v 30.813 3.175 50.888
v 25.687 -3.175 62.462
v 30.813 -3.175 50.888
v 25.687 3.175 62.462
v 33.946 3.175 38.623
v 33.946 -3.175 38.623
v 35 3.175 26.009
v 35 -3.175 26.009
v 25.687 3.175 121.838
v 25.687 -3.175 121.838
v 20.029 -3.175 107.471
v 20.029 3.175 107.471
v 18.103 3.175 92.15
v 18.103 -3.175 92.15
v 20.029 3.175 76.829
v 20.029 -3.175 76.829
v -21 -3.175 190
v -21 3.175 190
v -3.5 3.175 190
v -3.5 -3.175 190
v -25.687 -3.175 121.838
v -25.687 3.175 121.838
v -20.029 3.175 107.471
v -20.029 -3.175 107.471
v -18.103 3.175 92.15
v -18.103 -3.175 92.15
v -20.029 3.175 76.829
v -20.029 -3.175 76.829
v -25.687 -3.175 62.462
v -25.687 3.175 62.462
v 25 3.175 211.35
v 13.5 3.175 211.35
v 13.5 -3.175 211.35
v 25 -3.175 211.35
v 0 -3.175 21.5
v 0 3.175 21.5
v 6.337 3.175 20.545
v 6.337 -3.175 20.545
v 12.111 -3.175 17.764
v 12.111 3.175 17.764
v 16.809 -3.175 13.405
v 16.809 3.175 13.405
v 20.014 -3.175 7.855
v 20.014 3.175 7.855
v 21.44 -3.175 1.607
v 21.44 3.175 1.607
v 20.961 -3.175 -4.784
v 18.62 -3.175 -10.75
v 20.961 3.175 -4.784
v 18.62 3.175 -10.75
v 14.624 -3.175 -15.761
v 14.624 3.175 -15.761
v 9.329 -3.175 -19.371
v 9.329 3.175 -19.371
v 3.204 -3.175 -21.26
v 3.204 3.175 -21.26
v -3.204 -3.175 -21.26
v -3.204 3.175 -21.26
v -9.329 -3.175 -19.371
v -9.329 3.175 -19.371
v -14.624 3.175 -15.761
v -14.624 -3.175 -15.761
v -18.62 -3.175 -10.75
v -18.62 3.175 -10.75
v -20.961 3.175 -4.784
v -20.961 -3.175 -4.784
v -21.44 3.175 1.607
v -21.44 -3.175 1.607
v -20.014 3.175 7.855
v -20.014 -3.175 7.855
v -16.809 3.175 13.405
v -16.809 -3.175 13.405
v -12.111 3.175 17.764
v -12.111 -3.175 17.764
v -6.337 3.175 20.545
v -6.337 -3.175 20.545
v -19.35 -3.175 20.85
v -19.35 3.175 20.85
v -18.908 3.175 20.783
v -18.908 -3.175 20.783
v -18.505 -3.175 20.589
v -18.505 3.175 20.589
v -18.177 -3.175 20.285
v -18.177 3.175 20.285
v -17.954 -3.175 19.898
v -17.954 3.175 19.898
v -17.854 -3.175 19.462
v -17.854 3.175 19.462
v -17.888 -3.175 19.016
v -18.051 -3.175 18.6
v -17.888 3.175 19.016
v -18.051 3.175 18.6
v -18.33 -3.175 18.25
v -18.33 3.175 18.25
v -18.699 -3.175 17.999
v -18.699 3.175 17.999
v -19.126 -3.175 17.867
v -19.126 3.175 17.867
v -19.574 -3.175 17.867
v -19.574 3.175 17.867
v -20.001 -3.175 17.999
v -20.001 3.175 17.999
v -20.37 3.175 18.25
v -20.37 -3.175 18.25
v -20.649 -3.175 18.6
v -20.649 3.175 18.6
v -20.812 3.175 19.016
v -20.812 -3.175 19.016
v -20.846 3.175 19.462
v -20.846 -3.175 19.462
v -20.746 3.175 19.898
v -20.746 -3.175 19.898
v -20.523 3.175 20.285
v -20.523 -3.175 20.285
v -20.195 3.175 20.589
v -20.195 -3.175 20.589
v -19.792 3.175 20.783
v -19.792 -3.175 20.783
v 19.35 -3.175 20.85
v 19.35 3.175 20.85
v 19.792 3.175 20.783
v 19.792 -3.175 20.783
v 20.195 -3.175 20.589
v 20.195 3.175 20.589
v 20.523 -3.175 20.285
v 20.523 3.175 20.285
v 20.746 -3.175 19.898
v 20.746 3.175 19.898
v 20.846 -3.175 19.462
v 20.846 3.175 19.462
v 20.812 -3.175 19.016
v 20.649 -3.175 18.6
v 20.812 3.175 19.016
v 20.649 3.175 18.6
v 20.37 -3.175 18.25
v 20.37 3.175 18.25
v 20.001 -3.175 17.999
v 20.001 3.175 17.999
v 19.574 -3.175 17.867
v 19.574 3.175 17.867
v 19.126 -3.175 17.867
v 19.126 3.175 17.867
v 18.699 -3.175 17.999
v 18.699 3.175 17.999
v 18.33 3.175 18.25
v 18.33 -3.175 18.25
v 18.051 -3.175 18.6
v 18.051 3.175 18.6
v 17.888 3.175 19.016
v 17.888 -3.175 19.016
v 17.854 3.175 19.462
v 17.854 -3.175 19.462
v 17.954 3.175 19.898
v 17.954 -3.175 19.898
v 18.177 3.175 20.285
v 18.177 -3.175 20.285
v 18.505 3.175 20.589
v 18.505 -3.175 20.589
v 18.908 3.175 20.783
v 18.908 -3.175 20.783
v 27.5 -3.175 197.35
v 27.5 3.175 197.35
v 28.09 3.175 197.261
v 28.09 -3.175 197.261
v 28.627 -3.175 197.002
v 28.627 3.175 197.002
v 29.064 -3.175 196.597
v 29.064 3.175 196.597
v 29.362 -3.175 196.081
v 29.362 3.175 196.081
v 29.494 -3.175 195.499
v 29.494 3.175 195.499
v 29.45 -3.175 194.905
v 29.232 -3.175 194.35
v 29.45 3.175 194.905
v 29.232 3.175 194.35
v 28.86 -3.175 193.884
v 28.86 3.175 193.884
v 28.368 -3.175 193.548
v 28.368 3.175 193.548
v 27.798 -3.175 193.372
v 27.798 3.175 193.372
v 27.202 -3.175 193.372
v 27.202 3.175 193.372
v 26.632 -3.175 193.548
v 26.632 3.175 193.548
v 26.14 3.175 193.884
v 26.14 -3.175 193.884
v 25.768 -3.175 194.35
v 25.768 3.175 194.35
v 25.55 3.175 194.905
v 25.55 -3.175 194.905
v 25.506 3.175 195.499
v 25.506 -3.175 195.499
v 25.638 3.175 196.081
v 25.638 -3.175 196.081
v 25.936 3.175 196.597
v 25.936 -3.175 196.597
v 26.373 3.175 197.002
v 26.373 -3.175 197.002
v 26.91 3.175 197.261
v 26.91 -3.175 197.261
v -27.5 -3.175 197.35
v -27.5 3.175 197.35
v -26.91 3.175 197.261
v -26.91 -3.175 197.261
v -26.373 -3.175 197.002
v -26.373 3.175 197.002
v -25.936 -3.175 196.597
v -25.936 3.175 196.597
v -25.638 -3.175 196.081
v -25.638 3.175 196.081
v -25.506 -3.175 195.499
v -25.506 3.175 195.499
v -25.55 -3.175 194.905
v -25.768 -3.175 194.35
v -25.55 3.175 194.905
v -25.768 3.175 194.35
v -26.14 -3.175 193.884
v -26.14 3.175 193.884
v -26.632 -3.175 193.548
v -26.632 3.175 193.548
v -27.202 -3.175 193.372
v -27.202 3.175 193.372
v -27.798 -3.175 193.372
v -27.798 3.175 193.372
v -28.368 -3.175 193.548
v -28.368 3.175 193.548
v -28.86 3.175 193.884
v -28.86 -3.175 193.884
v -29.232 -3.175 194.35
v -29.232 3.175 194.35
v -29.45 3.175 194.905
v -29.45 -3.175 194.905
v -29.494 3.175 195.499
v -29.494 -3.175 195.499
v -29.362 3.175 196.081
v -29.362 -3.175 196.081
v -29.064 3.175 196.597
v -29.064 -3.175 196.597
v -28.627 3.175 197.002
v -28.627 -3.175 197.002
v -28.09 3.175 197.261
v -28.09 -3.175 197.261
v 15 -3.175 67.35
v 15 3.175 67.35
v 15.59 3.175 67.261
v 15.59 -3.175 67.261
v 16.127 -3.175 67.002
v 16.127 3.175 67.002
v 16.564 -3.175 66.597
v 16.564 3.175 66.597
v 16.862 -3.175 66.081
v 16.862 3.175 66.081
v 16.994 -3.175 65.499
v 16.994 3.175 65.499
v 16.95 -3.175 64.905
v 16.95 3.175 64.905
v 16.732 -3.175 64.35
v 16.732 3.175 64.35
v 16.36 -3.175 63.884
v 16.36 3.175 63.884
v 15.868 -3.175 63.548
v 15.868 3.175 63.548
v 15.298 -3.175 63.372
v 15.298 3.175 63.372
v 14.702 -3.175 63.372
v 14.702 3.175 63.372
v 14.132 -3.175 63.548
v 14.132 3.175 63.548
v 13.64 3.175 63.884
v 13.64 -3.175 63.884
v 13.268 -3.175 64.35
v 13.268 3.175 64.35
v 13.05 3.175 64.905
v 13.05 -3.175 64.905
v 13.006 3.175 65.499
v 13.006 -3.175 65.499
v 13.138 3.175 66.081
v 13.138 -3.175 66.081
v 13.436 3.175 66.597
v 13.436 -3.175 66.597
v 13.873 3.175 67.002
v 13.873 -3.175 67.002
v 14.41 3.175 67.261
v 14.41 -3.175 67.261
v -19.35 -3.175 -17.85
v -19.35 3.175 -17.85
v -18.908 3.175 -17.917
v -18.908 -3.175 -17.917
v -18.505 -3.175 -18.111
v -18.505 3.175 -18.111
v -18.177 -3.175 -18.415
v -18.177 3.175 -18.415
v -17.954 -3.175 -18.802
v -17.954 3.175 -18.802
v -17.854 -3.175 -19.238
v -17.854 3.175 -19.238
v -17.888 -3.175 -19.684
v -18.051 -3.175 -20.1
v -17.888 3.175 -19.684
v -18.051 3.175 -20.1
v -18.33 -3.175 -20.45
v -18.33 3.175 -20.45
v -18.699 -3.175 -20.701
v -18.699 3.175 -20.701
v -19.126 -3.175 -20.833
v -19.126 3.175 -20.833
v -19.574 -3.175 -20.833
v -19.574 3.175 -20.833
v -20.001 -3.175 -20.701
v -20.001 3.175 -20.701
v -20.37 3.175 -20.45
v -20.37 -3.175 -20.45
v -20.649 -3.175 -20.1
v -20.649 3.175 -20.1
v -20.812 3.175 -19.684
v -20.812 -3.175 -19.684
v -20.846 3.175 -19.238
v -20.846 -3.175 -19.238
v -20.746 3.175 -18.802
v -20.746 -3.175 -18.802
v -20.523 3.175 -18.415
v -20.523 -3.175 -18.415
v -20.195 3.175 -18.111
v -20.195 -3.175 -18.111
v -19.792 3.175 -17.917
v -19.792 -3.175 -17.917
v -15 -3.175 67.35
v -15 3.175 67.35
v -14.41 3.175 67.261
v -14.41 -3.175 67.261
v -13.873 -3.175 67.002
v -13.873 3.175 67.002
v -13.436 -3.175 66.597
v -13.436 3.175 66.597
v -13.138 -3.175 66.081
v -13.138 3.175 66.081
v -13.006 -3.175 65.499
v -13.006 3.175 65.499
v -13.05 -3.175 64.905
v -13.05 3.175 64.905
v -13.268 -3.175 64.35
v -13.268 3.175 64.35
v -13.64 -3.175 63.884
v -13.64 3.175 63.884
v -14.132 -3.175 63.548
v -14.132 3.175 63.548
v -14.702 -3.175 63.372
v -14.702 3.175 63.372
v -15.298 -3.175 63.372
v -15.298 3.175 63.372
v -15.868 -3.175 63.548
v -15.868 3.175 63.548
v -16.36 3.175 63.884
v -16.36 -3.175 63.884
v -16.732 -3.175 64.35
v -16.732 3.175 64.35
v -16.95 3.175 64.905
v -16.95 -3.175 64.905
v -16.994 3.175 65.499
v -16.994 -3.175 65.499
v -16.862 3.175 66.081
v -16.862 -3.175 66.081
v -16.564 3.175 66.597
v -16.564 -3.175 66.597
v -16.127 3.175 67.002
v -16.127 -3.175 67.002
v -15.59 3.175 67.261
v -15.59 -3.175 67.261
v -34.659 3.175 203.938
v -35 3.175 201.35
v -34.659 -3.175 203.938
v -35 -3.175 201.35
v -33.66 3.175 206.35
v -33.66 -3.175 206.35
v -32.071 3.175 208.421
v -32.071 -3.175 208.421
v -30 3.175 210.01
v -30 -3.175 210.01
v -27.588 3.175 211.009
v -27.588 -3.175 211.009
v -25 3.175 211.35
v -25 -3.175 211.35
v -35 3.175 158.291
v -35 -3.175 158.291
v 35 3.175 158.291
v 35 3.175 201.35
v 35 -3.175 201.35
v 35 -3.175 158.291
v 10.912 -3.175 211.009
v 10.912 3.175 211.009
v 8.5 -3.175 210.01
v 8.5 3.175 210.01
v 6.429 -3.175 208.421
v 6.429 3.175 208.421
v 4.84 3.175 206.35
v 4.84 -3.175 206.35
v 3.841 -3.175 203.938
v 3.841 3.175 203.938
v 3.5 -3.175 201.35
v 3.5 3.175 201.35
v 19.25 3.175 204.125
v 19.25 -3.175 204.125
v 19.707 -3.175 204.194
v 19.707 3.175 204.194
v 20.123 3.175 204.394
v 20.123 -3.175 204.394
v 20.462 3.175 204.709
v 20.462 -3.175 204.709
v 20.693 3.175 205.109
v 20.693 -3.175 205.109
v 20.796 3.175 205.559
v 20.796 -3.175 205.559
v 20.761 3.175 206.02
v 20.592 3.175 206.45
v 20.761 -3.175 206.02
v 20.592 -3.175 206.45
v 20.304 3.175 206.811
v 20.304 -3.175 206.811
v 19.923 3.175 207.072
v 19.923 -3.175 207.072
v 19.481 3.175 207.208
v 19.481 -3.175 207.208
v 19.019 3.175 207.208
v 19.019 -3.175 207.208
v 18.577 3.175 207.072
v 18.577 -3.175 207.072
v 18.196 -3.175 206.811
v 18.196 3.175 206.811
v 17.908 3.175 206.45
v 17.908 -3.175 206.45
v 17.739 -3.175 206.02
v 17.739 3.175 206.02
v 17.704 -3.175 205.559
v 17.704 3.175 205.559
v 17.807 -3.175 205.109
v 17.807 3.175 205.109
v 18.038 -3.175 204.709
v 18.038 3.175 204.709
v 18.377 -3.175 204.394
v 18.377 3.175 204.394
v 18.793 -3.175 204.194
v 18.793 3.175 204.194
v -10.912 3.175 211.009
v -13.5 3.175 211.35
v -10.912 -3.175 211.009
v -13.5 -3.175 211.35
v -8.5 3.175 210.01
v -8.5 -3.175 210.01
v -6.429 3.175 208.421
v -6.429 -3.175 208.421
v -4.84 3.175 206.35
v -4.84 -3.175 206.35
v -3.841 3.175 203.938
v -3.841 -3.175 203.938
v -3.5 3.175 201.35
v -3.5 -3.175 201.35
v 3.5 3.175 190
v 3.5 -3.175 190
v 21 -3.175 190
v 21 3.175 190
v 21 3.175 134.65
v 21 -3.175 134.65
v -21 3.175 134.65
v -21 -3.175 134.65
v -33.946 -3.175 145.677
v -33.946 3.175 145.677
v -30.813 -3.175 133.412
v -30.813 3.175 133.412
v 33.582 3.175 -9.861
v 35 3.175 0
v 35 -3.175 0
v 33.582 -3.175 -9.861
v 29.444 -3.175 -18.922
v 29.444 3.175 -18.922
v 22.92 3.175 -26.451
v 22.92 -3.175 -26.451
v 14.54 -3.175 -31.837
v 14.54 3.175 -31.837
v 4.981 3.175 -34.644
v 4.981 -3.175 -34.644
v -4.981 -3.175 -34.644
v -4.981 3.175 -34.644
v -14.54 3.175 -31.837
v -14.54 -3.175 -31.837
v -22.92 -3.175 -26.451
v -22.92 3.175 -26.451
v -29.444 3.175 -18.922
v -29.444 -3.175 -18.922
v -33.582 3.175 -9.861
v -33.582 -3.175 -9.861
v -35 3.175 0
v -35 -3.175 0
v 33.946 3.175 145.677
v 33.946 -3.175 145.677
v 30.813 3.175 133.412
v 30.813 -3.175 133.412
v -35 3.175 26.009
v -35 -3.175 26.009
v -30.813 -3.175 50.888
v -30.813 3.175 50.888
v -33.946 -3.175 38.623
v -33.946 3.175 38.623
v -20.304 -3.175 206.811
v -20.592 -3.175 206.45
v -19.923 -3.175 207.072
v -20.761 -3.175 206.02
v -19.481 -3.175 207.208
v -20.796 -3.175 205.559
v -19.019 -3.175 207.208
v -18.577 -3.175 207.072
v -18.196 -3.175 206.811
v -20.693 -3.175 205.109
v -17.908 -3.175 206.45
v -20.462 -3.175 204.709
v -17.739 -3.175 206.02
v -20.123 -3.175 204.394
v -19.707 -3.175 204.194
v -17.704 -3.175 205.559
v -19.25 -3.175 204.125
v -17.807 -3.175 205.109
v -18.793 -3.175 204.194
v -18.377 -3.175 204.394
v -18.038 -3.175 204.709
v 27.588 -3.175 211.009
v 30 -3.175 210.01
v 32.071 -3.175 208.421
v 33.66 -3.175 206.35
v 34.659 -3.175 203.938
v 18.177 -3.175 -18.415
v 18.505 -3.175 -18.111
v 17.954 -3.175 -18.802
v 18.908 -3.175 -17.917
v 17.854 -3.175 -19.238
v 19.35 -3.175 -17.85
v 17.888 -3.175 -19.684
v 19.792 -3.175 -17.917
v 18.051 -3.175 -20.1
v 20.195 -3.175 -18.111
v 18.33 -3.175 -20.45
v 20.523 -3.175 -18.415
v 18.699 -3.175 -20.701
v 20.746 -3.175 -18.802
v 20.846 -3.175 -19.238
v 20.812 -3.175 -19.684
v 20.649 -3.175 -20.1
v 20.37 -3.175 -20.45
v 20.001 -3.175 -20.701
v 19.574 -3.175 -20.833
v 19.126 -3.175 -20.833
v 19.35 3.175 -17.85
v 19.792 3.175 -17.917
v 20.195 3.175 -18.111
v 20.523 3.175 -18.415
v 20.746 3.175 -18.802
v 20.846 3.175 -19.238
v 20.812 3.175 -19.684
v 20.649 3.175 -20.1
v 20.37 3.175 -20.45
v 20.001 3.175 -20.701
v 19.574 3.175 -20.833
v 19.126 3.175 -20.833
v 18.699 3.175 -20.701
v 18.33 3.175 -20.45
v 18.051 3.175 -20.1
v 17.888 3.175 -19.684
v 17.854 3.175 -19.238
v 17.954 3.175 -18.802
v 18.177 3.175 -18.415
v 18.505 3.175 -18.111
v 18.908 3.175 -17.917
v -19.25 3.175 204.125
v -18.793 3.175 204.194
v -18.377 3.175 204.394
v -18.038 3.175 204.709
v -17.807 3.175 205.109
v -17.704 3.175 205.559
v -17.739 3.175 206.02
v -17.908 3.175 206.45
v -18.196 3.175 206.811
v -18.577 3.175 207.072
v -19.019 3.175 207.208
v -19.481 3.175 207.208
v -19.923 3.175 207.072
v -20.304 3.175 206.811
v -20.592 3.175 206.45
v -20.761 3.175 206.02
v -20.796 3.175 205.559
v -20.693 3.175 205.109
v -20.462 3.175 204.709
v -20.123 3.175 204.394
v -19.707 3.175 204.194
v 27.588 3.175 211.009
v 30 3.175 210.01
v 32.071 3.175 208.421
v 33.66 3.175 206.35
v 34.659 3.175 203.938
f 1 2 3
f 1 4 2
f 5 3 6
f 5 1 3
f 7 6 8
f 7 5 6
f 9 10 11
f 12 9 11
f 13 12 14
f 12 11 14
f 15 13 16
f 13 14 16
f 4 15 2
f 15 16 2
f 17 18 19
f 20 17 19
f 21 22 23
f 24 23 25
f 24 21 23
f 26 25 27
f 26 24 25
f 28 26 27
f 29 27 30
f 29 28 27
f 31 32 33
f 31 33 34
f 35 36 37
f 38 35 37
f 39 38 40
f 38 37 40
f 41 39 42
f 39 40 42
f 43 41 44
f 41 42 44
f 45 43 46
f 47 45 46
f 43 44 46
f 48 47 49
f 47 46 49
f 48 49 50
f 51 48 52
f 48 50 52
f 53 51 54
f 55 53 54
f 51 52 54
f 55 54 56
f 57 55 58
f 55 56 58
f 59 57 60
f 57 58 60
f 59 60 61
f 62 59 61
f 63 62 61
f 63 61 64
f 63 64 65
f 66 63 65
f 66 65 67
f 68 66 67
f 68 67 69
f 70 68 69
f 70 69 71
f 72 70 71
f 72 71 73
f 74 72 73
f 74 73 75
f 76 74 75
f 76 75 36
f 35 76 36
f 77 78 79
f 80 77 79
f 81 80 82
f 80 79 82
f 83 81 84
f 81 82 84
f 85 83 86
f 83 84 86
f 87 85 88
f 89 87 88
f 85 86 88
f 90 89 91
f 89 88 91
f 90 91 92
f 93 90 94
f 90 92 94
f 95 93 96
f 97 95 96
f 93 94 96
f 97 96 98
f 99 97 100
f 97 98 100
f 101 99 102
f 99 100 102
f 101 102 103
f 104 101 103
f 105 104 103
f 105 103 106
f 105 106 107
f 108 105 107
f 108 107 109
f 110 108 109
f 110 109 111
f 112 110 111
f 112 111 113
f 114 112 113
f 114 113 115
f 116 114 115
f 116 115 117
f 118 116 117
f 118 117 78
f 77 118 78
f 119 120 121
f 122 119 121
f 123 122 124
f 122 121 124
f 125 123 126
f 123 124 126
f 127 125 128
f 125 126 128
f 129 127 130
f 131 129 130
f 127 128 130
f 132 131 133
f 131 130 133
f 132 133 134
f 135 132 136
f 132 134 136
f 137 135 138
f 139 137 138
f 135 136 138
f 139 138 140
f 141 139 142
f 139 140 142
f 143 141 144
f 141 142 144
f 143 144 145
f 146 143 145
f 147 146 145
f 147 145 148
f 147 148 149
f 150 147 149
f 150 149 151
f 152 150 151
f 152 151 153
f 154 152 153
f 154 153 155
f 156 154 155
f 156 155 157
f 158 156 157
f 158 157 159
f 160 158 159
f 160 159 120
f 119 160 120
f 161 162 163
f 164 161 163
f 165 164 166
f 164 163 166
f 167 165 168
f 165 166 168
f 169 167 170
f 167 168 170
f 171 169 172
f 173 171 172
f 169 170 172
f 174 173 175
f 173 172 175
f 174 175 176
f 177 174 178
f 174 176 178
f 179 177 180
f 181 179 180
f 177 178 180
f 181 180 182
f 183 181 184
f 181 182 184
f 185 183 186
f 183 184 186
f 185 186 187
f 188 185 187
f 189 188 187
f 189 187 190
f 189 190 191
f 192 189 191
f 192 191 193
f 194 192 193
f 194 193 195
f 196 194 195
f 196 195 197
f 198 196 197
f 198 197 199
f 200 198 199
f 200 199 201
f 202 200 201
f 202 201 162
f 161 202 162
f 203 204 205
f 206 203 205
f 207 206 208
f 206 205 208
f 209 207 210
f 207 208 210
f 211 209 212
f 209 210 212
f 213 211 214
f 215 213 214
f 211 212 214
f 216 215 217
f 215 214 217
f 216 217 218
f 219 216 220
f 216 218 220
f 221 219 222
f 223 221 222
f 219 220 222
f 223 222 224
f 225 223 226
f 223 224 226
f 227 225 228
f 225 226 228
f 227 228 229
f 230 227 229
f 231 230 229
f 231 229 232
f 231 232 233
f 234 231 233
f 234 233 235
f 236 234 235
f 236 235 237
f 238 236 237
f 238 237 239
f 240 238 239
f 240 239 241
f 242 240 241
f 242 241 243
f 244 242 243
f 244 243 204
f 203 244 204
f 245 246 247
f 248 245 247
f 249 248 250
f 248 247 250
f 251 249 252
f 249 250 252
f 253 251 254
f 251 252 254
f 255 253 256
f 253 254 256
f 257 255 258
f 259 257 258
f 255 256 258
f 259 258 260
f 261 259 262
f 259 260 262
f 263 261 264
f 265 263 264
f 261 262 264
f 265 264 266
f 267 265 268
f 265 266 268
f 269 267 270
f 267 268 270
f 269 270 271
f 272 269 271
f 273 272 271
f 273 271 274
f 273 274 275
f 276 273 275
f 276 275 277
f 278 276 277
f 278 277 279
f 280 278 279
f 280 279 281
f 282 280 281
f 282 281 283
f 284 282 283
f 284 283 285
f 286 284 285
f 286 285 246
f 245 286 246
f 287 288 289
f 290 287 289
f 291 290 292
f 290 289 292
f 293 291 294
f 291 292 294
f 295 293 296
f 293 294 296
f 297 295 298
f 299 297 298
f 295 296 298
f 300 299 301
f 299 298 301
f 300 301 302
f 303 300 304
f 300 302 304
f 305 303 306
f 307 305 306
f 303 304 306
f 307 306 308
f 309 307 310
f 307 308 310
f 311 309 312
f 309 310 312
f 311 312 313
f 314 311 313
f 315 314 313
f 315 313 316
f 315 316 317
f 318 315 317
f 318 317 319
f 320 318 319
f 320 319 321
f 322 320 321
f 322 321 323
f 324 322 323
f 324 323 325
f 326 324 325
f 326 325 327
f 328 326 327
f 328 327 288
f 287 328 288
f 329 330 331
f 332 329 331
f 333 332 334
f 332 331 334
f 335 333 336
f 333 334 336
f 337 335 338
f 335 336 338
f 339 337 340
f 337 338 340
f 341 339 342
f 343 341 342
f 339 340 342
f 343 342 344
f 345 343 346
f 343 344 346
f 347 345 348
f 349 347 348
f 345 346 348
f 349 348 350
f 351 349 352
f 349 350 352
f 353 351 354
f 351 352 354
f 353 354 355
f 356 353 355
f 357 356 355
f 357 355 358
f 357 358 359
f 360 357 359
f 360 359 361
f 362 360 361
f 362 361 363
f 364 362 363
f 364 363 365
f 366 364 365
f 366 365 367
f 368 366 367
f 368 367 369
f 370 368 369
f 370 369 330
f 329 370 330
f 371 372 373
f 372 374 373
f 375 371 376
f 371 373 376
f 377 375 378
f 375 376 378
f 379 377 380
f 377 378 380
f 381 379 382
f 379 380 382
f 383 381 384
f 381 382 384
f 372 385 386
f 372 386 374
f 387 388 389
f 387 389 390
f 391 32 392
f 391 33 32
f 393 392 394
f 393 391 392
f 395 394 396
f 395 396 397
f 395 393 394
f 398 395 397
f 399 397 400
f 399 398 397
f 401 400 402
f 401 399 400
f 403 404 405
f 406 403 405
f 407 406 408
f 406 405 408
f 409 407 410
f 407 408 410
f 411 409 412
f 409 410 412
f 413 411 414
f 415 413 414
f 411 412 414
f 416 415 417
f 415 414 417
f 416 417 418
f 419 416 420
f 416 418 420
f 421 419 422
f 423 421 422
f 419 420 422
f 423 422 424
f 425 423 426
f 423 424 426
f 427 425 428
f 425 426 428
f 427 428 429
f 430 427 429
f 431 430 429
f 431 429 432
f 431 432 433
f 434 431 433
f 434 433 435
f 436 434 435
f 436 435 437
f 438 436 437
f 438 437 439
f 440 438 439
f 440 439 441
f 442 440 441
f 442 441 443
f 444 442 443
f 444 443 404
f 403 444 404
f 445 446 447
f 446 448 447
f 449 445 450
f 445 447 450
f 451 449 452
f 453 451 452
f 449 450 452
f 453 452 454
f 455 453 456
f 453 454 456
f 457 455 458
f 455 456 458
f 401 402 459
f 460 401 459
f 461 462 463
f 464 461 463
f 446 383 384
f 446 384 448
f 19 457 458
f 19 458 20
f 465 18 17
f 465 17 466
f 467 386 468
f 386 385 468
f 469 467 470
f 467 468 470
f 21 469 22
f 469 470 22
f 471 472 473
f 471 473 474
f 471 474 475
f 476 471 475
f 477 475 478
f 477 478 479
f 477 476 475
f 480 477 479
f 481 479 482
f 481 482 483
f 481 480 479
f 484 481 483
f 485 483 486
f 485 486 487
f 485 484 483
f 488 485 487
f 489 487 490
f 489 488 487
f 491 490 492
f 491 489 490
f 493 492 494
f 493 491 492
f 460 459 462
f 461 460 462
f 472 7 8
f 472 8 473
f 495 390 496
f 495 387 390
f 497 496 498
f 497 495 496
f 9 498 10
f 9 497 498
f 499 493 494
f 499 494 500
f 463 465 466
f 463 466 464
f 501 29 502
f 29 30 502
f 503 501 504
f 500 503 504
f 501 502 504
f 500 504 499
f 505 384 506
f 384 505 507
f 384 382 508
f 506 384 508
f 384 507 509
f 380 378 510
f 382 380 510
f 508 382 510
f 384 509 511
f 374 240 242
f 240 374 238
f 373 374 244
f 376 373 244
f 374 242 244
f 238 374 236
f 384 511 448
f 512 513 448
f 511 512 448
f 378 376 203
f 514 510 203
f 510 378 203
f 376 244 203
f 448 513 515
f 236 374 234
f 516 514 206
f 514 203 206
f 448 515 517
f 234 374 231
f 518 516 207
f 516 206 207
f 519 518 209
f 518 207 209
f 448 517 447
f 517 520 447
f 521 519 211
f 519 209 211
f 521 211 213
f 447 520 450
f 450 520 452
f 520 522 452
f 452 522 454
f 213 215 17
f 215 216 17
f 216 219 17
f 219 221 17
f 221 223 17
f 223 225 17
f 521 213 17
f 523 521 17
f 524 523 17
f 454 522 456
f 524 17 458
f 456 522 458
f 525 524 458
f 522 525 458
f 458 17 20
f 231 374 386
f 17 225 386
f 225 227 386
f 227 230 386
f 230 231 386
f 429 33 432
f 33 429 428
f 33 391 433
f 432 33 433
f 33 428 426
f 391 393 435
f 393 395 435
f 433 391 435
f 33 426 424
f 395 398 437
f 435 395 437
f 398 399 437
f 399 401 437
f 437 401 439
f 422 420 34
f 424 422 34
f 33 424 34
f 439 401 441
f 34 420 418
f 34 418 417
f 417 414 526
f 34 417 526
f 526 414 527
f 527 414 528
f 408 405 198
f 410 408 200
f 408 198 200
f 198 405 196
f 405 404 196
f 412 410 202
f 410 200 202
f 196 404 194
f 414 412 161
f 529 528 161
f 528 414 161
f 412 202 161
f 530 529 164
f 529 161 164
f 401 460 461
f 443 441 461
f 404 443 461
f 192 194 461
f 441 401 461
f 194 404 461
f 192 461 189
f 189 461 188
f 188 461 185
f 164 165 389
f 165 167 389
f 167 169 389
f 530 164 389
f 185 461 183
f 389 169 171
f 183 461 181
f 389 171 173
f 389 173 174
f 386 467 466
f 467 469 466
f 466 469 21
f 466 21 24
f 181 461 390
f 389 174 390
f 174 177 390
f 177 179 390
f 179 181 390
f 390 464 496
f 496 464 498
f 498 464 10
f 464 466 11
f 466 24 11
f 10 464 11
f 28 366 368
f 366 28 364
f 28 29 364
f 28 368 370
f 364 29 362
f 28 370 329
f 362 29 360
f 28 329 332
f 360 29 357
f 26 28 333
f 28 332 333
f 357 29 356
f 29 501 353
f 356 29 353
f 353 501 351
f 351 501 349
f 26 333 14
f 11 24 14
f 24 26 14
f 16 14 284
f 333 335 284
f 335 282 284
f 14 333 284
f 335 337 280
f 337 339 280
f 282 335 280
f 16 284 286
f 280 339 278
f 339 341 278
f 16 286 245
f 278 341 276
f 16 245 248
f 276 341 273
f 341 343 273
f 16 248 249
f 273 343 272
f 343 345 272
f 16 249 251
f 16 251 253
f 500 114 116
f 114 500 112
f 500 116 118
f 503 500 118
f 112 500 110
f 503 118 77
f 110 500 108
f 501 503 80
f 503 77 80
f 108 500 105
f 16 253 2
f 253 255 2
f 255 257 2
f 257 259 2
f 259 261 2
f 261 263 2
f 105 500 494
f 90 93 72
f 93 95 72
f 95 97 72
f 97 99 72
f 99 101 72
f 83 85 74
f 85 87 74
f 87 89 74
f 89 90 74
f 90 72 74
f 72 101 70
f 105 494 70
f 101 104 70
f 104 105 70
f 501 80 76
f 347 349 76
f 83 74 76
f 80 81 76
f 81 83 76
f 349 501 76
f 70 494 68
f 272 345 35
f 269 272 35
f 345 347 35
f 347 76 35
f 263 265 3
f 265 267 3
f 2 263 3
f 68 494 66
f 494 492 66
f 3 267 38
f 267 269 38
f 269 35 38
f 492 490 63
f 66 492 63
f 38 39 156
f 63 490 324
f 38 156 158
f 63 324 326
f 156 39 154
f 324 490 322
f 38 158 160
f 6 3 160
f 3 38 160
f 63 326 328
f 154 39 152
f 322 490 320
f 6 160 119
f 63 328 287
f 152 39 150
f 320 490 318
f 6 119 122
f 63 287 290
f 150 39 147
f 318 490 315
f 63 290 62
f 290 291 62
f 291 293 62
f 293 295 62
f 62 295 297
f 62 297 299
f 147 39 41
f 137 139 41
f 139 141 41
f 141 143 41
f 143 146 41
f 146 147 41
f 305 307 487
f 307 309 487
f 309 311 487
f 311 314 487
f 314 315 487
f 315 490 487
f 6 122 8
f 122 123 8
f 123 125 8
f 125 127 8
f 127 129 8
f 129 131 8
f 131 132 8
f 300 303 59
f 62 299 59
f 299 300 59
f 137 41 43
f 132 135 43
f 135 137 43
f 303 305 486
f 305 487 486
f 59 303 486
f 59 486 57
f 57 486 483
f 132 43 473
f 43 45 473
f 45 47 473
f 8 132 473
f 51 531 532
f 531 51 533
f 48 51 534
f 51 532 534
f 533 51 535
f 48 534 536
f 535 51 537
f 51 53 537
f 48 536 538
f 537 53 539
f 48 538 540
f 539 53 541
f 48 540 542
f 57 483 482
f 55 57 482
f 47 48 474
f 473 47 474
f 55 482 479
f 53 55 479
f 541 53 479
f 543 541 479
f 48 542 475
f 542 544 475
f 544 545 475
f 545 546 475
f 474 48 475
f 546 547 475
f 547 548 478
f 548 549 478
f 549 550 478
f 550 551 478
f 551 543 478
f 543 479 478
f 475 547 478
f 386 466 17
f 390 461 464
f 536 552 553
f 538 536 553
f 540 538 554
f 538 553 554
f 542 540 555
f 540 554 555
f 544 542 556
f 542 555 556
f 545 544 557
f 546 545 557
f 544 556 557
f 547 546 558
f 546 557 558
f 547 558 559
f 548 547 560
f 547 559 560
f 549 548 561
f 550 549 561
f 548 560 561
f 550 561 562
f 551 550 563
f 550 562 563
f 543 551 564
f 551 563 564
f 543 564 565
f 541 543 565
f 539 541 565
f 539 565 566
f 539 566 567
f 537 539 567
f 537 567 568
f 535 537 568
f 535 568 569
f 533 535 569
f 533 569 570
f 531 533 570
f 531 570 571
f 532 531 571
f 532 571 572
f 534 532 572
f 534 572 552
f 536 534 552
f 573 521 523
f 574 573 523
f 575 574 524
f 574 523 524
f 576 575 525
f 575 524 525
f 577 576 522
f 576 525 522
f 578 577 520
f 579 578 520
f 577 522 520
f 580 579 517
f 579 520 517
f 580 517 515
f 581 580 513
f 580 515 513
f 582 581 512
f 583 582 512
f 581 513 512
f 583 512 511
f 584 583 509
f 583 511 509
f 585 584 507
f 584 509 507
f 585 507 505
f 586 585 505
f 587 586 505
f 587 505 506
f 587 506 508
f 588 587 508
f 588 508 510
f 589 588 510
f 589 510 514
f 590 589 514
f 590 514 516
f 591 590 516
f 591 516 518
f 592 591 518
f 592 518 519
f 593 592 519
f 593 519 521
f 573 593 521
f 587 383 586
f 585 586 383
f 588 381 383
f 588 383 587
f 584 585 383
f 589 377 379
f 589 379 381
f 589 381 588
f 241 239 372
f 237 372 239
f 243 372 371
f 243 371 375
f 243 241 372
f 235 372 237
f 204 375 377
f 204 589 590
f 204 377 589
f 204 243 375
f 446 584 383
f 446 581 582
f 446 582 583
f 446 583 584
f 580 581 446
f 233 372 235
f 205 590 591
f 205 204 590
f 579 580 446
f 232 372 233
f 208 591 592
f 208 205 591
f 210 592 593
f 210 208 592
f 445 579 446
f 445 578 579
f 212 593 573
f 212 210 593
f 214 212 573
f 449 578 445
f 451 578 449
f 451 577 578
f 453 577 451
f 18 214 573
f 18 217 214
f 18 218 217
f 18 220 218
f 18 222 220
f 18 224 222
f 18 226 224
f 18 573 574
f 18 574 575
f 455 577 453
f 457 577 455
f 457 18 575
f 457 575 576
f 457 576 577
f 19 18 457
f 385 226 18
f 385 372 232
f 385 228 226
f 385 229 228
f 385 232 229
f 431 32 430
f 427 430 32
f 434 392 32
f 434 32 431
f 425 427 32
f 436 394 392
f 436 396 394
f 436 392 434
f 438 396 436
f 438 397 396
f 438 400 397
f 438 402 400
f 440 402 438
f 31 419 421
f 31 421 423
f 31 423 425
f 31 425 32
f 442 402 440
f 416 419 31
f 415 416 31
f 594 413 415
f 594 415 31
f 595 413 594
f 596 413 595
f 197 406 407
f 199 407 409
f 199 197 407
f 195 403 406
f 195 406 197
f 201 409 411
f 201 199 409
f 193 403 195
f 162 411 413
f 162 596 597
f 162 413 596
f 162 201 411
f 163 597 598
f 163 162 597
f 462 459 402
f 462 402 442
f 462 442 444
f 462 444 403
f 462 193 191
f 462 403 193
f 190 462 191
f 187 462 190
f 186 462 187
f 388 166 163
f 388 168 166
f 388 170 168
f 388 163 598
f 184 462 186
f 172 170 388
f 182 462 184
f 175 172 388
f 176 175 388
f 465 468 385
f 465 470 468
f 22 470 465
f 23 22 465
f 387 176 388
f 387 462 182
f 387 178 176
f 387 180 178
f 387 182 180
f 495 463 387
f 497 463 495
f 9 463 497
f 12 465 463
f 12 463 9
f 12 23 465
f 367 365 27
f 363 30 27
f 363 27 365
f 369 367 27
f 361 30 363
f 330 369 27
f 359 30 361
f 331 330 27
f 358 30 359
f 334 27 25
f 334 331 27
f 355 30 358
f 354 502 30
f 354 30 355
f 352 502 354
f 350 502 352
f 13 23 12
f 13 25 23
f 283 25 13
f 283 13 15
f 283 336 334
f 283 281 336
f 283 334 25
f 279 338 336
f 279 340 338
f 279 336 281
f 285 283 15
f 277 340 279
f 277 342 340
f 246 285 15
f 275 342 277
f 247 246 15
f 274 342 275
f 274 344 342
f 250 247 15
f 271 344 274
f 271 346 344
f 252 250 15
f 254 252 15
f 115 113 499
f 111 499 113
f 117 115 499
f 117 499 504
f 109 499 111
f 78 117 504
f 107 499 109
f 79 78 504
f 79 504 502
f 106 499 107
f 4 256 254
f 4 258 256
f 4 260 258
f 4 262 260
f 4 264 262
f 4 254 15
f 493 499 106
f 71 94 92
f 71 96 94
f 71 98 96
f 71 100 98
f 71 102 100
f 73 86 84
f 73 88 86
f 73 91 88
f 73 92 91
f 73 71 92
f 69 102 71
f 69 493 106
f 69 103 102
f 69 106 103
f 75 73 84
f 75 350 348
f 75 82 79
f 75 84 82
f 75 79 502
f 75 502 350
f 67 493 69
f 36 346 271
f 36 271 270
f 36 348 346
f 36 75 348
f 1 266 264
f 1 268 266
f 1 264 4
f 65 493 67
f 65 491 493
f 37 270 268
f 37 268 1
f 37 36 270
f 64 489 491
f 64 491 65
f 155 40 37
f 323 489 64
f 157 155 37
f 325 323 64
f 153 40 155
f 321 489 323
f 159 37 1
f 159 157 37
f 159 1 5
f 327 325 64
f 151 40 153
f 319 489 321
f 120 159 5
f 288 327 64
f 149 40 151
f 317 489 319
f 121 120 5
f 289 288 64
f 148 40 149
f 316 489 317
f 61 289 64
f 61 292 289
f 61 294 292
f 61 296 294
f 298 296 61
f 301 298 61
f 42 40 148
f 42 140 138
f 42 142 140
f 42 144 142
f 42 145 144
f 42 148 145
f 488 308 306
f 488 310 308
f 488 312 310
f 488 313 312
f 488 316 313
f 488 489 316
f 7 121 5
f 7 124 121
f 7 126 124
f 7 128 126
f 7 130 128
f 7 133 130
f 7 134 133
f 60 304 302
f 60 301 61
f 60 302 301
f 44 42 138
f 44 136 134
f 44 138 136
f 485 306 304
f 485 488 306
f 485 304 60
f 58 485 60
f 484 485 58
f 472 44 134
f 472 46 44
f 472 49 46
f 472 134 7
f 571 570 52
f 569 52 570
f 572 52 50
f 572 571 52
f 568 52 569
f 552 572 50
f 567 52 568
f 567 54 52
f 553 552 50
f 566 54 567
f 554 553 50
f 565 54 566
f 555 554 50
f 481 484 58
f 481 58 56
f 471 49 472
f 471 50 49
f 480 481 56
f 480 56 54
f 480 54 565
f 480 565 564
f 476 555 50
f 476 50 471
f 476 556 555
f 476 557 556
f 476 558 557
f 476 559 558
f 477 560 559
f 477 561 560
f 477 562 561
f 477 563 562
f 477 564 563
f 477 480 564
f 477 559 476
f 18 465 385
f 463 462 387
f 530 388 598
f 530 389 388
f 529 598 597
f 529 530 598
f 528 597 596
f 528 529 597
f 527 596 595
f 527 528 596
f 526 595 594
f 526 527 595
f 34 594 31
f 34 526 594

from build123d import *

# Parameters (mm, degrees)
BOSS_EXTRUDE1_DEPTH = 3.175
SKETCH2_R           = 21.5
CUT_EXTRUDE1_DEPTH  = 215.322525648
SKETCH3_W           = 42
SKETCH3_H           = 55.35
SKETCH3_W_2         = 7
SKETCH3_H_2         = 21.35
CUT_EXTRUDE2_DEPTH  = 215.322525648
SKETCH4_R           = 1.5
CUT_EXTRUDE3_DEPTH  = 215.322525648
FILLET1_R           = 10
SKETCH5_R           = 2
CUT_EXTRUDE4_DEPTH  = 215.322525648
CUT_EXTRUDE5_DEPTH  = 215.322525648
FILLET3_R           = 76
SKETCH7_R           = 1.55
CUT_EXTRUDE6_DEPTH  = 215.322525648


with BuildPart() as part:
    # Sketch1 → Boss-Extrude1 (new, symmetric)
    with BuildSketch(Plane(origin=(0, 0, 0), x_dir=(1, 0, 0), z_dir=(0, 1, 0))):
        with BuildLine():
            Line((35, -211.35), (35, 0))
            ThreePointArc((35, 0), (0, 35), (-35, 0))
            Line((-35, 0), (-35, -211.35))
            Line((-35, -211.35), (35, -211.35))
        make_face()
    extrude(amount=BOSS_EXTRUDE1_DEPTH, both=True)

    # Sketch2 → Cut-Extrude1 (cut, through all)
    with BuildSketch(Plane(origin=(0, 3.175, 0), x_dir=(1, 0, 0), z_dir=(0, 1, 0))):
        with Locations(Location((0, 0, 0), (0, 0, 270))):
            Circle(SKETCH2_R)
    extrude(amount=-CUT_EXTRUDE1_DEPTH, mode=Mode.SUBTRACT)

    # Sketch3 → Cut-Extrude2 (cut, through all)
    with BuildSketch(Plane(origin=(0, 3.175, 0), x_dir=(1, 0, 0), z_dir=(0, 1, 0))):
        with Locations((0, -162.325)):
            Rectangle(SKETCH3_W, SKETCH3_H)
        with Locations((0, -200.675)):
            Rectangle(SKETCH3_W_2, SKETCH3_H_2)
    extrude(amount=-CUT_EXTRUDE2_DEPTH, mode=Mode.SUBTRACT)

    # Sketch4 → Cut-Extrude3 (cut, through all)
    with BuildSketch(Plane(origin=(0, 3.175, 0), x_dir=(1, 0, 0), z_dir=(0, 1, 0))):
        with Locations(Location((-19.35, 19.35, 0), (0, 0, 270))):
            Circle(SKETCH4_R)
        with Locations(Location((19.35, 19.35, 0), (0, 0, 270))):
            Circle(SKETCH4_R)
        with Locations(Location((19.35, -19.35, 0), (0, 0, 270))):
            Circle(SKETCH4_R)
        with Locations(Location((-19.35, -19.35, 0), (0, 0, 270))):
            Circle(SKETCH4_R)
    extrude(amount=-CUT_EXTRUDE3_DEPTH, mode=Mode.SUBTRACT)

    # Fillet1
    fillet1_edges = [part.edges().sort_by_distance(p)[0] for p in [
        (3.5, 0, 211.35),
        (-3.5, 0, 211.35),
        (35, 0, 211.35),
        (-35, 0, 211.35),
    ]]
    fillet(fillet1_edges, radius=FILLET1_R)

    # Sketch5 → Cut-Extrude4 (cut, through all)
    with BuildSketch(Plane(origin=(0, 3.175, 0), x_dir=(1, 0, 0), z_dir=(0, 1, 0))):
        with Locations(Location((-15, -65.35, 0), (0, 0, 270))):
            Circle(SKETCH5_R)
        with Locations(Location((15, -65.35, 0), (0, 0, 270))):
            Circle(SKETCH5_R)
        with Locations(Location((-27.5, -195.35, 0), (0, 0, 270))):
            Circle(SKETCH5_R)
        with Locations(Location((27.5, -195.35, 0), (0, 0, 270))):
            Circle(SKETCH5_R)
    extrude(amount=-CUT_EXTRUDE4_DEPTH, mode=Mode.SUBTRACT)

    # Sketch6 → Cut-Extrude5 (cut, through all)
    with BuildSketch(Plane.XZ.offset(3.175)):
        with BuildLine():
            Line((-35, 49.65), (-35, 134.65))
            ThreePointArc((-35, 134.65), (-18.102907984, 92.15), (-35, 49.65))
        make_face()
    cut_extrude5 = extrude(amount=-CUT_EXTRUDE5_DEPTH, mode=Mode.SUBTRACT)

    # Mirror1: Cut-Extrude5 across plane
    add(cut_extrude5.mirror(Plane(origin=(0, 0, 0), x_dir=(0, 0, 1), z_dir=(1, 0, 0))), mode=Mode.SUBTRACT)

    # Fillet3
    fillet3_edges = [part.edges().sort_by_distance(p)[0] for p in [
        (-35, 0, 134.65),
        (-35, 0, 49.65),
        (35, 0, 49.65),
        (35, 0, 134.65),
    ]]
    fillet(fillet3_edges, radius=FILLET3_R)

    # Sketch7 → Cut-Extrude6 (cut, through all)
    with BuildSketch(Plane.XZ.offset(3.175)):
        with Locations(Location((-19.25, 205.675, 0), (0, 0, 270))):
            Circle(SKETCH7_R)
        with Locations(Location((19.25, 205.675, 0), (0, 0, 270))):
            Circle(SKETCH7_R)
    extrude(amount=-CUT_EXTRUDE6_DEPTH, mode=Mode.SUBTRACT)


solid = part.part
